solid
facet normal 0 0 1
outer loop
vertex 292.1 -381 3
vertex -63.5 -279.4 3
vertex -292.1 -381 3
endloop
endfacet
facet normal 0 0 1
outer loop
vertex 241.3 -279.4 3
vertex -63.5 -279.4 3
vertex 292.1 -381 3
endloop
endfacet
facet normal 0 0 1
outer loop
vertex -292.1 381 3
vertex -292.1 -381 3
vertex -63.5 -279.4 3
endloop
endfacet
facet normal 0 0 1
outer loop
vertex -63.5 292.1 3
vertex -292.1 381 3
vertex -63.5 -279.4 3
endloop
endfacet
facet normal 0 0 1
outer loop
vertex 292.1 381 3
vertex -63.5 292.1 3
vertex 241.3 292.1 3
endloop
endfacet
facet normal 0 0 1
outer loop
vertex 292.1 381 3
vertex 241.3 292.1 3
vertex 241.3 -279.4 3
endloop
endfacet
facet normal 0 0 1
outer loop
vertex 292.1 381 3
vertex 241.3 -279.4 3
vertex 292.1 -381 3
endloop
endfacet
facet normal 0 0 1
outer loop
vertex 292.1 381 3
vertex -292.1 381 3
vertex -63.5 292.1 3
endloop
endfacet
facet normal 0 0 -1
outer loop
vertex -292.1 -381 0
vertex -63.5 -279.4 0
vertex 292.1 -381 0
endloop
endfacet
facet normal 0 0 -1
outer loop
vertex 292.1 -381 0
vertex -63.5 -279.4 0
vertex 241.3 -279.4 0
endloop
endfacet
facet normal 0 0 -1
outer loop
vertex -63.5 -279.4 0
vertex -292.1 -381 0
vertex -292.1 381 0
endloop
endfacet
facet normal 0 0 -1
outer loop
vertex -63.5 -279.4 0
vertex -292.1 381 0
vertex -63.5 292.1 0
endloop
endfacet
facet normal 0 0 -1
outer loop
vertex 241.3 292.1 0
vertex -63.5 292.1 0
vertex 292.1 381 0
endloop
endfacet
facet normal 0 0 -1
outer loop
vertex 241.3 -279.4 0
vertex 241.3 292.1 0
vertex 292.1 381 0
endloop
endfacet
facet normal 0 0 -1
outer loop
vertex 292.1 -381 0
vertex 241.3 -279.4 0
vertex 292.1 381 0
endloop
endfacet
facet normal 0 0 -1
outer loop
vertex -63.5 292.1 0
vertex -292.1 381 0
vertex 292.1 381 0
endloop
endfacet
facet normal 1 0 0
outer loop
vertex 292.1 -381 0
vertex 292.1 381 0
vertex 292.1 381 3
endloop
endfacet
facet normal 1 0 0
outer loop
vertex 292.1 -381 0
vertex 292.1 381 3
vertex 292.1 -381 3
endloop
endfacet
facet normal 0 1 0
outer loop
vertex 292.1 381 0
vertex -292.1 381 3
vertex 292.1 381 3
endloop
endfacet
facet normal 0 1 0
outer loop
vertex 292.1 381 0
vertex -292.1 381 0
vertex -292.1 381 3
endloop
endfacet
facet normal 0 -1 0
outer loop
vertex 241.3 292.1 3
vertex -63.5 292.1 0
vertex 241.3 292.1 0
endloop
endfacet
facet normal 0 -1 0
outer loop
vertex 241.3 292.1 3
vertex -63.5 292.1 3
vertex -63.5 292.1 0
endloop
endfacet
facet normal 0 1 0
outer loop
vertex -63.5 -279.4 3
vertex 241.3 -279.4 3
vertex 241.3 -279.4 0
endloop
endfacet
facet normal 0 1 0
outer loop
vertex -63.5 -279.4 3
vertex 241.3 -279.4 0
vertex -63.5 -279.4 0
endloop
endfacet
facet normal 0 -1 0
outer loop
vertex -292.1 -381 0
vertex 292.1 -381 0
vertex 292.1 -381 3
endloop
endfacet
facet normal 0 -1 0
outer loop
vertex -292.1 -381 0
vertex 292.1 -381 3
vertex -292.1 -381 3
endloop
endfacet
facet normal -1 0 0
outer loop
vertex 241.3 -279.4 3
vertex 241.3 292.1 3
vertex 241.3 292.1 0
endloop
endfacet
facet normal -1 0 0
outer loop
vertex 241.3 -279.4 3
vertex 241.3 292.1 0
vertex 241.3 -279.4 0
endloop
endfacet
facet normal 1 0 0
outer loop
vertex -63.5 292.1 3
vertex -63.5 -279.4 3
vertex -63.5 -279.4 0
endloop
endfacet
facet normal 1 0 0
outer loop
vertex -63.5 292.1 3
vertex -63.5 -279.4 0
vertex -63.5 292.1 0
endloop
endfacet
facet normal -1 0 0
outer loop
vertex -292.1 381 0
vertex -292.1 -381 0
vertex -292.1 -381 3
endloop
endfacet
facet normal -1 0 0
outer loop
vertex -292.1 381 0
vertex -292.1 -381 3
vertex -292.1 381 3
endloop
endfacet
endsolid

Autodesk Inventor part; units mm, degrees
ref_plane "YZ Plane" through (0, 0, 0) normal (1, 0, 0) x (0, 1, 0)
ref_plane "XZ Plane" through (0, 0, 0) normal (0, 1, 0) x (-1, 0, 0)
ref_plane "XY Plane" through (0, 0, 0) normal (0, 0, 1) x (1, 0, 0)
sketch "Sketch1" plane through (0, 0, 0) normal (0, 0, 1) x (1, 0, 0)
  line L0 (-292.1, 381) -> (292.1, 381)
  line L1 (292.1, 381) -> (292.1, -381)
  line L2 (292.1, -381) -> (-292.1, -381)
  line L3 (-292.1, -381) -> (-292.1, 381)
  point P0 (0, 0)
  point P1 (0, 381)
  point P2 (292.1, 0)
  dimension "d0" = 584.2
  dimension "d1" = 762
extrude "Extrusion1" add sketch "Sketch1" along normal blind 3
sketch "Sketch2" plane through (0, 0, 3) normal (0, 0, 1) x (1, 0, 0)
  line L0 (292.1, 381) -> (292.1, -381) projected
  line L1 (292.1, -381) -> (-292.1, -381) projected
  line L2 (-63.5, 292.1) -> (241.3, 292.1)
  line L3 (241.3, 292.1) -> (241.3, -279.4)
  line L4 (241.3, -279.4) -> (-63.5, -279.4)
  line L5 (-63.5, -279.4) -> (-63.5, 292.1)
  point P0 (0, 0)
  dimension "d4" = 50.8
  dimension "d5" = 101.6
  dimension "d6" = 571.5
  dimension "d7" = 304.8
extrude "Extrusion2" cut sketch "Sketch2" against normal blind 3
properties part number "Left Side"
